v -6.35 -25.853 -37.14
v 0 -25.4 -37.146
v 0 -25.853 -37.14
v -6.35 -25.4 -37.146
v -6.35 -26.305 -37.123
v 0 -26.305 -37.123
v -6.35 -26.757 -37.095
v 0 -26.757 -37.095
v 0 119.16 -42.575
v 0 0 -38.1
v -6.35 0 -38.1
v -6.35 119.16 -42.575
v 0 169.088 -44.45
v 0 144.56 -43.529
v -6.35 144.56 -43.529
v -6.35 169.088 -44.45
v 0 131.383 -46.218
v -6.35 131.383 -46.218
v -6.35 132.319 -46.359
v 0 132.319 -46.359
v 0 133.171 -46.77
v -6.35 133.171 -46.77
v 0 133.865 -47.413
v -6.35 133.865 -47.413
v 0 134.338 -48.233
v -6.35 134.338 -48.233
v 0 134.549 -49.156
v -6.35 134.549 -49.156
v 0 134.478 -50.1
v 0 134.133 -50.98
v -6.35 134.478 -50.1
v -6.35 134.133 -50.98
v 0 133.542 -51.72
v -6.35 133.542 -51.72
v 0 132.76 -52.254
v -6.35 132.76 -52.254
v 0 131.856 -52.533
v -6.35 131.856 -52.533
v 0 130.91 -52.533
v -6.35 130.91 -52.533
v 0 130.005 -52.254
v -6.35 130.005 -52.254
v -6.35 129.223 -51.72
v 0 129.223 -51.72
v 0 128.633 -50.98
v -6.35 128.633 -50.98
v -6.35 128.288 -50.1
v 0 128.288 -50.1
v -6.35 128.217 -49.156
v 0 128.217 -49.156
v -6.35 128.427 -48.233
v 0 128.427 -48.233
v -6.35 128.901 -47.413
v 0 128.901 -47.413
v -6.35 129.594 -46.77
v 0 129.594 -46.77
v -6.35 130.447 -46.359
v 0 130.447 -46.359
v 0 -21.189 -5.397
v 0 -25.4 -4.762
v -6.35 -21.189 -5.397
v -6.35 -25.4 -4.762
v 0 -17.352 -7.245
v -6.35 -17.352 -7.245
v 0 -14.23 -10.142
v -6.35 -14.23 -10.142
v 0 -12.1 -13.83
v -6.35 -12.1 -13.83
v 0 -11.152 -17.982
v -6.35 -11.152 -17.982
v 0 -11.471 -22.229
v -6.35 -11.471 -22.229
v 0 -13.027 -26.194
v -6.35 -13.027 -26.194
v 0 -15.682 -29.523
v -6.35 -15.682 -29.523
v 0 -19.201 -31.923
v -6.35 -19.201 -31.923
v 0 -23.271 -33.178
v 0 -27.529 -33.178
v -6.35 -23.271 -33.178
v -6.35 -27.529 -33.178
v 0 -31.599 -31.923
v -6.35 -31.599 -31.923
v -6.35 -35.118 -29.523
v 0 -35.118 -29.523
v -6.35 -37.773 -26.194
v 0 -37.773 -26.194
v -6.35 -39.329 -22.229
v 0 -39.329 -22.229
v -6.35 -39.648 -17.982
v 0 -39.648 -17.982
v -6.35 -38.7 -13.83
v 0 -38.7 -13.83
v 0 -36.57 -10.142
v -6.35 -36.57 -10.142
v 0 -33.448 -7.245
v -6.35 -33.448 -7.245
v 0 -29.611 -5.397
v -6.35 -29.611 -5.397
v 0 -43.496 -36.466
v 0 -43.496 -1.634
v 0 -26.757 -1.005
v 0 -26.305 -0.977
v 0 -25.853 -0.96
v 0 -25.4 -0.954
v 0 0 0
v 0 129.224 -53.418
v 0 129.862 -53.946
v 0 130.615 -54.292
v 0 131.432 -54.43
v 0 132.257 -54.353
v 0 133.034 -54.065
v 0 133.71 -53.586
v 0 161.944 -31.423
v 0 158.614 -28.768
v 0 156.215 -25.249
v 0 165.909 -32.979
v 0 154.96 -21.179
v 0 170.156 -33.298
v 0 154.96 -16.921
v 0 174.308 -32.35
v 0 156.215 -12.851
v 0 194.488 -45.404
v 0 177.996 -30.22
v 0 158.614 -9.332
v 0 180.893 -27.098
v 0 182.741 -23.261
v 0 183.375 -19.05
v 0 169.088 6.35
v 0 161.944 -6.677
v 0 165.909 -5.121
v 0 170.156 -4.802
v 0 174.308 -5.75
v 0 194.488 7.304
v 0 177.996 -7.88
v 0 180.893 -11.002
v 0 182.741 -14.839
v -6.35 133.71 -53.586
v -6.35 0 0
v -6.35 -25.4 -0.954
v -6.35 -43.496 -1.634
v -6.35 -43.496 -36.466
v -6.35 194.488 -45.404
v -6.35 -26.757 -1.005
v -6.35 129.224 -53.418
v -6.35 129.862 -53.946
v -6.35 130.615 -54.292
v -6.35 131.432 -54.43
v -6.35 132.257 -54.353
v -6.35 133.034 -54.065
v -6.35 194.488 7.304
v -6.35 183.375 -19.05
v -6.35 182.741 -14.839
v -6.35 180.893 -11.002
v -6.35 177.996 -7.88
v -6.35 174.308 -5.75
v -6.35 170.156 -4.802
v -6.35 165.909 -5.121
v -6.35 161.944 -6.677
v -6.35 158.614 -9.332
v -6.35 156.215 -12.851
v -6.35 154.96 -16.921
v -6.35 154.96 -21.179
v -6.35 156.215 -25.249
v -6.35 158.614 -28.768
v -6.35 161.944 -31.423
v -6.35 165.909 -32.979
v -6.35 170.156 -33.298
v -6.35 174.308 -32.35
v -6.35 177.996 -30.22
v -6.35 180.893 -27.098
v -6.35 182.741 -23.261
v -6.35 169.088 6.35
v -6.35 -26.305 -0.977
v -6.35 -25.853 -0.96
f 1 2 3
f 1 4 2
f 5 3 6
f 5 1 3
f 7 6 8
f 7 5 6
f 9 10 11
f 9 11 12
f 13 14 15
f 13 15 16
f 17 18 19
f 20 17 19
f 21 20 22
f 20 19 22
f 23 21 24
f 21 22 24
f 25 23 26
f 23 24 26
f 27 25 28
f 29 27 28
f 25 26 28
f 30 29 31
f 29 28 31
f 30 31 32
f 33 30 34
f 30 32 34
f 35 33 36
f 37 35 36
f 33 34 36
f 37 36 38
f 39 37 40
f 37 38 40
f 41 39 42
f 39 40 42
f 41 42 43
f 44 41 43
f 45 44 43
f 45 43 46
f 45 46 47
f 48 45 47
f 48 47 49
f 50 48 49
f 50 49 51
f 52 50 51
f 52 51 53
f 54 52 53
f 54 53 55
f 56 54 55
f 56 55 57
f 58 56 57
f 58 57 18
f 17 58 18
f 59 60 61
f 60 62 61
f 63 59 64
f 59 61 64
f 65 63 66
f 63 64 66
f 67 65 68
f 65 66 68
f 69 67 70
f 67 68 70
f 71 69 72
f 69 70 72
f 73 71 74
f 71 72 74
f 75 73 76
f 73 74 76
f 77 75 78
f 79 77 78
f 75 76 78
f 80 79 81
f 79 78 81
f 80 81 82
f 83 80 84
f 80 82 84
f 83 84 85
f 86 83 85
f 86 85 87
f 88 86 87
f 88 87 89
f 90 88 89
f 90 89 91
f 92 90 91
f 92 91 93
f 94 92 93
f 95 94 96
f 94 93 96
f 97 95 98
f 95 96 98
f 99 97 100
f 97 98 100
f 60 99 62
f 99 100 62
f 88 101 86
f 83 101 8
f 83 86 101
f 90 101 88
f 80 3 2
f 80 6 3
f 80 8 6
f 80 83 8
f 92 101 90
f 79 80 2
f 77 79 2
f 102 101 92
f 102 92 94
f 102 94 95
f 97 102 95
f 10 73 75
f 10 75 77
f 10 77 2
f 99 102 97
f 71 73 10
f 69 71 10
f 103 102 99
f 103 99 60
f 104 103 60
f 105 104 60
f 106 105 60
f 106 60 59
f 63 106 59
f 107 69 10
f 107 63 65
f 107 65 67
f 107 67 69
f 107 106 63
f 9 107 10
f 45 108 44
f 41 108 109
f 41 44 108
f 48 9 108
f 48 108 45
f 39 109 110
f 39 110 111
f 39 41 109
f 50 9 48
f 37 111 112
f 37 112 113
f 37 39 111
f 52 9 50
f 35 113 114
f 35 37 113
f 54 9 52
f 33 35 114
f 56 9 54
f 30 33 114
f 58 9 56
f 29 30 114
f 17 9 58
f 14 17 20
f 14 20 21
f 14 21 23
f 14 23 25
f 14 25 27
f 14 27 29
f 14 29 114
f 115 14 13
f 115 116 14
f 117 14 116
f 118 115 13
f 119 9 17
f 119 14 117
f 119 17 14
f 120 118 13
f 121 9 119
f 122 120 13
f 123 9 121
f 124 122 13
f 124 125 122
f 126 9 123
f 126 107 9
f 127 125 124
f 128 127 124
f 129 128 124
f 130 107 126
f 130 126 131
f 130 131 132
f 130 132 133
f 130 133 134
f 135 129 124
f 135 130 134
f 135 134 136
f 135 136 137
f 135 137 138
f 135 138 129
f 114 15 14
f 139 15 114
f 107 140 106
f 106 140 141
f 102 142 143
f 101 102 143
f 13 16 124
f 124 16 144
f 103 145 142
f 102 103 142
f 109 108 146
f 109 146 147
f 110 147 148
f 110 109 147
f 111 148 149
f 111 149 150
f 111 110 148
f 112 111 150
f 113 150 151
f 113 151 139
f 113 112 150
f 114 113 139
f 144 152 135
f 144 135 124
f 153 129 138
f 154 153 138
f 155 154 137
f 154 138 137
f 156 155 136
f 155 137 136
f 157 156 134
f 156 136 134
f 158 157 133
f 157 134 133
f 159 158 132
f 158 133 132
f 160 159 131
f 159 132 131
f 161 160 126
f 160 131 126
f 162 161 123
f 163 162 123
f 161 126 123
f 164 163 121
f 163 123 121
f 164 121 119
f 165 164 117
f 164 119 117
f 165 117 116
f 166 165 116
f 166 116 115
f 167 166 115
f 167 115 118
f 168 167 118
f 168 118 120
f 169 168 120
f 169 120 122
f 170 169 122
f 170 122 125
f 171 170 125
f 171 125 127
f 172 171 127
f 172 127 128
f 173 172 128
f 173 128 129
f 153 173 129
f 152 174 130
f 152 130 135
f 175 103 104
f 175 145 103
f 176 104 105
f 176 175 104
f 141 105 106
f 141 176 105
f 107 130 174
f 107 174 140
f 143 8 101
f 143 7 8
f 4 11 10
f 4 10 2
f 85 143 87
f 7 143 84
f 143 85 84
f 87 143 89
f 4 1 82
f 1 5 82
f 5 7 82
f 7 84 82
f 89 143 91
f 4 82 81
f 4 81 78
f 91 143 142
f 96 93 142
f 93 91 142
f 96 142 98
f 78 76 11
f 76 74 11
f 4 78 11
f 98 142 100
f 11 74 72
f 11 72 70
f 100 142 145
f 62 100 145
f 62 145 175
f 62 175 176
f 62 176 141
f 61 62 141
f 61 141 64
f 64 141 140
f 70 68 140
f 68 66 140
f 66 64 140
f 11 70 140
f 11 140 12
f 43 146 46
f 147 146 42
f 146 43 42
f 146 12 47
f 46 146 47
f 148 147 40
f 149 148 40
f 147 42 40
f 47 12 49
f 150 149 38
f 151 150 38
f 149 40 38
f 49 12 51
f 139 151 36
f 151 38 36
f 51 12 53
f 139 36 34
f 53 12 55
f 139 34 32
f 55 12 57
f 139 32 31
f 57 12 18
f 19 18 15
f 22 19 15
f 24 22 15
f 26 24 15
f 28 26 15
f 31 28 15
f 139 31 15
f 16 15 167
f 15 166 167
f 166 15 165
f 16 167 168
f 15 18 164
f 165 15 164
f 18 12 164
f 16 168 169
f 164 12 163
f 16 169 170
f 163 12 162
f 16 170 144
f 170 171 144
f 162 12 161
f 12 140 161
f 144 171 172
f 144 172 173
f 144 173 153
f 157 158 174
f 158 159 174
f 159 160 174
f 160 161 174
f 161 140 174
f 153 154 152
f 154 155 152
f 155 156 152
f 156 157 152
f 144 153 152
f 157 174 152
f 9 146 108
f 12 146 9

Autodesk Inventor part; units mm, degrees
ref_plane "YZ Plane" through (0, 0, 0) normal (1, 0, 0) x (0, 1, 0)
ref_plane "XZ Plane" through (0, 0, 0) normal (0, 1, 0) x (-1, 0, 0)
ref_plane "XY Plane" through (0, 0, 0) normal (0, 0, 1) x (1, 0, 0)
sketch "Sketch1" plane through (0, 0, 0) normal (1, 0, 0) x (0, 1, 0)
  line L0 (0, -38.1) -> (169.0878, -44.45)
  line L1 (169.0878, -44.45) -> (169.0878, 6.35)
  line L2 (169.0878, 6.35) -> (0, 0)
  line L3 (0, 0) -> (0, -38.1)
  arc A0 (169.0878, -44.45) -> (169.0878, 6.35) centre (169.0878, -19.05) ccw
  circle A1 centre (169.0878, -19.05) radius 14.2875
  point P0 (0, -19.05)
  point P1 (169.0878, -33.3375)
  point P2 (169.0878, -4.7625)
  dimension "d3" = 50.8
  dimension "d4" = 38.1
  dimension "d5" = 28.575
  dimension "d9" = 169.0878
extrude "Extrusion1" add sketch "Sketch1" against normal blind 6.35 contours L3 L2 L1 A1 L0 | L1 A1 A0
sketch "Sketch3" plane through (-6.35, 0, 0) normal (-1, 0, 0) x (0, 0, 1)
  line L0 (-38.1, 0) -> (0, 0) projected
  line L1 (0, 0) -> (-0.9539, -25.4)
  line L2 (-44.45, 169.0878) -> (-38.1, 0) projected
  line L3 (-38.1, 0) -> (-37.1461, -25.4)
  line L4 (0, 0) -> (6.35, 169.0878) projected
  line L5 (-37.1461, -25.4) -> (-0.9539, -25.4)
  arc A0 (-37.1461, -25.4) -> (-0.9539, -25.4) centre (-19.05, -25.4) ccw
  circle A1 centre (-19.05, -25.4) radius 14.2875
  dimension "d12" = 25.4
  dimension "d13" = 28.575
extrude "Extrusion2" add sketch "Sketch3" against normal blind 6.35 contours L0 L1 L5 A1 L3 | L5 A1 A0
sketch "Sketch4" plane through (-6.35, 0, 0) normal (-1, 0, 0) x (0, 0, 1)
  line L0 (6.35, 169.0878) -> (-0.9539, -25.4) projected
  line L1 (-0.9539, -25.4) -> (-1.6335, -43.4961)
  line L2 (-37.1461, -25.4) -> (-44.45, 169.0878) projected
  line L3 (-37.1461, -25.4) -> (-36.4665, -43.4961)
  arc A0 (-37.1461, -25.4) -> (-0.9539, -25.4) centre (-19.05, -25.4) ccw projected
  line L4 (-1.6335, -43.4961) -> (-36.4665, -43.4961)
  line L5 (6.35, 169.0878) -> (7.3039, 194.4878)
  line L6 (-44.45, 169.0878) -> (-45.4039, 194.4878)
  arc A1 (6.35, 169.0878) -> (-44.45, 169.0878) centre (-19.05, 169.0878) ccw projected
  line L7 (7.3039, 194.4878) -> (-45.4039, 194.4878)
  point P0 (0, 0)
  point P1 (-19.05, -43.4961)
  point P2 (-19.05, -43.4961)
  point P3 (-19.05, 194.4878)
  point P4 (-19.05, 194.4878)
  point P5 (-19.05, -43.4961)
  point P6 (-1.0049, -26.7573)
  point P7 (-37.0951, -26.7573)
  point P8 (-19.05, 194.4878)
extrude "Extrusion3" add sketch "Sketch4" against normal blind 6.35 contours A1 L7 L5 | A1 L6 L7 | L1 L4 A0 | L4 L3 A0
sketch "Sketch5" plane through (-6.35, 0, 0) normal (-1, 0, 0) x (0, 0, 1)
  circle A0 centre (-49.393, 131.3829) radius 3.175
  line L0 (-36.4665, -43.4961) -> (-1.6335, -43.4961) projected
  line L1 (-0.9539, -25.4) -> (7.3039, 194.4878) projected
  line L2 (-45.4039, 194.4878) -> (-37.1461, -25.4) projected
  line L3 (-43.5289, 144.5595) -> (-55.743, 131.3829)
  line L4 (-55.743, 131.3829) -> (-42.575, 119.1595)
  point P0 (0, 0)
  dimension "d18" = 6.35
  dimension "d19" = 174.879
  dimension "d29" = 25.4
  dimension "d30" = 12.7
  dimension "d31" = 6.35
extrude "Extrusion4" add sketch "Sketch5" against normal blind 6.35
fillet "Fillet1" radius 3.175 1 edges at (-3.175, 131.3829, -55.743)
properties part number "Intake - Side Panel"
